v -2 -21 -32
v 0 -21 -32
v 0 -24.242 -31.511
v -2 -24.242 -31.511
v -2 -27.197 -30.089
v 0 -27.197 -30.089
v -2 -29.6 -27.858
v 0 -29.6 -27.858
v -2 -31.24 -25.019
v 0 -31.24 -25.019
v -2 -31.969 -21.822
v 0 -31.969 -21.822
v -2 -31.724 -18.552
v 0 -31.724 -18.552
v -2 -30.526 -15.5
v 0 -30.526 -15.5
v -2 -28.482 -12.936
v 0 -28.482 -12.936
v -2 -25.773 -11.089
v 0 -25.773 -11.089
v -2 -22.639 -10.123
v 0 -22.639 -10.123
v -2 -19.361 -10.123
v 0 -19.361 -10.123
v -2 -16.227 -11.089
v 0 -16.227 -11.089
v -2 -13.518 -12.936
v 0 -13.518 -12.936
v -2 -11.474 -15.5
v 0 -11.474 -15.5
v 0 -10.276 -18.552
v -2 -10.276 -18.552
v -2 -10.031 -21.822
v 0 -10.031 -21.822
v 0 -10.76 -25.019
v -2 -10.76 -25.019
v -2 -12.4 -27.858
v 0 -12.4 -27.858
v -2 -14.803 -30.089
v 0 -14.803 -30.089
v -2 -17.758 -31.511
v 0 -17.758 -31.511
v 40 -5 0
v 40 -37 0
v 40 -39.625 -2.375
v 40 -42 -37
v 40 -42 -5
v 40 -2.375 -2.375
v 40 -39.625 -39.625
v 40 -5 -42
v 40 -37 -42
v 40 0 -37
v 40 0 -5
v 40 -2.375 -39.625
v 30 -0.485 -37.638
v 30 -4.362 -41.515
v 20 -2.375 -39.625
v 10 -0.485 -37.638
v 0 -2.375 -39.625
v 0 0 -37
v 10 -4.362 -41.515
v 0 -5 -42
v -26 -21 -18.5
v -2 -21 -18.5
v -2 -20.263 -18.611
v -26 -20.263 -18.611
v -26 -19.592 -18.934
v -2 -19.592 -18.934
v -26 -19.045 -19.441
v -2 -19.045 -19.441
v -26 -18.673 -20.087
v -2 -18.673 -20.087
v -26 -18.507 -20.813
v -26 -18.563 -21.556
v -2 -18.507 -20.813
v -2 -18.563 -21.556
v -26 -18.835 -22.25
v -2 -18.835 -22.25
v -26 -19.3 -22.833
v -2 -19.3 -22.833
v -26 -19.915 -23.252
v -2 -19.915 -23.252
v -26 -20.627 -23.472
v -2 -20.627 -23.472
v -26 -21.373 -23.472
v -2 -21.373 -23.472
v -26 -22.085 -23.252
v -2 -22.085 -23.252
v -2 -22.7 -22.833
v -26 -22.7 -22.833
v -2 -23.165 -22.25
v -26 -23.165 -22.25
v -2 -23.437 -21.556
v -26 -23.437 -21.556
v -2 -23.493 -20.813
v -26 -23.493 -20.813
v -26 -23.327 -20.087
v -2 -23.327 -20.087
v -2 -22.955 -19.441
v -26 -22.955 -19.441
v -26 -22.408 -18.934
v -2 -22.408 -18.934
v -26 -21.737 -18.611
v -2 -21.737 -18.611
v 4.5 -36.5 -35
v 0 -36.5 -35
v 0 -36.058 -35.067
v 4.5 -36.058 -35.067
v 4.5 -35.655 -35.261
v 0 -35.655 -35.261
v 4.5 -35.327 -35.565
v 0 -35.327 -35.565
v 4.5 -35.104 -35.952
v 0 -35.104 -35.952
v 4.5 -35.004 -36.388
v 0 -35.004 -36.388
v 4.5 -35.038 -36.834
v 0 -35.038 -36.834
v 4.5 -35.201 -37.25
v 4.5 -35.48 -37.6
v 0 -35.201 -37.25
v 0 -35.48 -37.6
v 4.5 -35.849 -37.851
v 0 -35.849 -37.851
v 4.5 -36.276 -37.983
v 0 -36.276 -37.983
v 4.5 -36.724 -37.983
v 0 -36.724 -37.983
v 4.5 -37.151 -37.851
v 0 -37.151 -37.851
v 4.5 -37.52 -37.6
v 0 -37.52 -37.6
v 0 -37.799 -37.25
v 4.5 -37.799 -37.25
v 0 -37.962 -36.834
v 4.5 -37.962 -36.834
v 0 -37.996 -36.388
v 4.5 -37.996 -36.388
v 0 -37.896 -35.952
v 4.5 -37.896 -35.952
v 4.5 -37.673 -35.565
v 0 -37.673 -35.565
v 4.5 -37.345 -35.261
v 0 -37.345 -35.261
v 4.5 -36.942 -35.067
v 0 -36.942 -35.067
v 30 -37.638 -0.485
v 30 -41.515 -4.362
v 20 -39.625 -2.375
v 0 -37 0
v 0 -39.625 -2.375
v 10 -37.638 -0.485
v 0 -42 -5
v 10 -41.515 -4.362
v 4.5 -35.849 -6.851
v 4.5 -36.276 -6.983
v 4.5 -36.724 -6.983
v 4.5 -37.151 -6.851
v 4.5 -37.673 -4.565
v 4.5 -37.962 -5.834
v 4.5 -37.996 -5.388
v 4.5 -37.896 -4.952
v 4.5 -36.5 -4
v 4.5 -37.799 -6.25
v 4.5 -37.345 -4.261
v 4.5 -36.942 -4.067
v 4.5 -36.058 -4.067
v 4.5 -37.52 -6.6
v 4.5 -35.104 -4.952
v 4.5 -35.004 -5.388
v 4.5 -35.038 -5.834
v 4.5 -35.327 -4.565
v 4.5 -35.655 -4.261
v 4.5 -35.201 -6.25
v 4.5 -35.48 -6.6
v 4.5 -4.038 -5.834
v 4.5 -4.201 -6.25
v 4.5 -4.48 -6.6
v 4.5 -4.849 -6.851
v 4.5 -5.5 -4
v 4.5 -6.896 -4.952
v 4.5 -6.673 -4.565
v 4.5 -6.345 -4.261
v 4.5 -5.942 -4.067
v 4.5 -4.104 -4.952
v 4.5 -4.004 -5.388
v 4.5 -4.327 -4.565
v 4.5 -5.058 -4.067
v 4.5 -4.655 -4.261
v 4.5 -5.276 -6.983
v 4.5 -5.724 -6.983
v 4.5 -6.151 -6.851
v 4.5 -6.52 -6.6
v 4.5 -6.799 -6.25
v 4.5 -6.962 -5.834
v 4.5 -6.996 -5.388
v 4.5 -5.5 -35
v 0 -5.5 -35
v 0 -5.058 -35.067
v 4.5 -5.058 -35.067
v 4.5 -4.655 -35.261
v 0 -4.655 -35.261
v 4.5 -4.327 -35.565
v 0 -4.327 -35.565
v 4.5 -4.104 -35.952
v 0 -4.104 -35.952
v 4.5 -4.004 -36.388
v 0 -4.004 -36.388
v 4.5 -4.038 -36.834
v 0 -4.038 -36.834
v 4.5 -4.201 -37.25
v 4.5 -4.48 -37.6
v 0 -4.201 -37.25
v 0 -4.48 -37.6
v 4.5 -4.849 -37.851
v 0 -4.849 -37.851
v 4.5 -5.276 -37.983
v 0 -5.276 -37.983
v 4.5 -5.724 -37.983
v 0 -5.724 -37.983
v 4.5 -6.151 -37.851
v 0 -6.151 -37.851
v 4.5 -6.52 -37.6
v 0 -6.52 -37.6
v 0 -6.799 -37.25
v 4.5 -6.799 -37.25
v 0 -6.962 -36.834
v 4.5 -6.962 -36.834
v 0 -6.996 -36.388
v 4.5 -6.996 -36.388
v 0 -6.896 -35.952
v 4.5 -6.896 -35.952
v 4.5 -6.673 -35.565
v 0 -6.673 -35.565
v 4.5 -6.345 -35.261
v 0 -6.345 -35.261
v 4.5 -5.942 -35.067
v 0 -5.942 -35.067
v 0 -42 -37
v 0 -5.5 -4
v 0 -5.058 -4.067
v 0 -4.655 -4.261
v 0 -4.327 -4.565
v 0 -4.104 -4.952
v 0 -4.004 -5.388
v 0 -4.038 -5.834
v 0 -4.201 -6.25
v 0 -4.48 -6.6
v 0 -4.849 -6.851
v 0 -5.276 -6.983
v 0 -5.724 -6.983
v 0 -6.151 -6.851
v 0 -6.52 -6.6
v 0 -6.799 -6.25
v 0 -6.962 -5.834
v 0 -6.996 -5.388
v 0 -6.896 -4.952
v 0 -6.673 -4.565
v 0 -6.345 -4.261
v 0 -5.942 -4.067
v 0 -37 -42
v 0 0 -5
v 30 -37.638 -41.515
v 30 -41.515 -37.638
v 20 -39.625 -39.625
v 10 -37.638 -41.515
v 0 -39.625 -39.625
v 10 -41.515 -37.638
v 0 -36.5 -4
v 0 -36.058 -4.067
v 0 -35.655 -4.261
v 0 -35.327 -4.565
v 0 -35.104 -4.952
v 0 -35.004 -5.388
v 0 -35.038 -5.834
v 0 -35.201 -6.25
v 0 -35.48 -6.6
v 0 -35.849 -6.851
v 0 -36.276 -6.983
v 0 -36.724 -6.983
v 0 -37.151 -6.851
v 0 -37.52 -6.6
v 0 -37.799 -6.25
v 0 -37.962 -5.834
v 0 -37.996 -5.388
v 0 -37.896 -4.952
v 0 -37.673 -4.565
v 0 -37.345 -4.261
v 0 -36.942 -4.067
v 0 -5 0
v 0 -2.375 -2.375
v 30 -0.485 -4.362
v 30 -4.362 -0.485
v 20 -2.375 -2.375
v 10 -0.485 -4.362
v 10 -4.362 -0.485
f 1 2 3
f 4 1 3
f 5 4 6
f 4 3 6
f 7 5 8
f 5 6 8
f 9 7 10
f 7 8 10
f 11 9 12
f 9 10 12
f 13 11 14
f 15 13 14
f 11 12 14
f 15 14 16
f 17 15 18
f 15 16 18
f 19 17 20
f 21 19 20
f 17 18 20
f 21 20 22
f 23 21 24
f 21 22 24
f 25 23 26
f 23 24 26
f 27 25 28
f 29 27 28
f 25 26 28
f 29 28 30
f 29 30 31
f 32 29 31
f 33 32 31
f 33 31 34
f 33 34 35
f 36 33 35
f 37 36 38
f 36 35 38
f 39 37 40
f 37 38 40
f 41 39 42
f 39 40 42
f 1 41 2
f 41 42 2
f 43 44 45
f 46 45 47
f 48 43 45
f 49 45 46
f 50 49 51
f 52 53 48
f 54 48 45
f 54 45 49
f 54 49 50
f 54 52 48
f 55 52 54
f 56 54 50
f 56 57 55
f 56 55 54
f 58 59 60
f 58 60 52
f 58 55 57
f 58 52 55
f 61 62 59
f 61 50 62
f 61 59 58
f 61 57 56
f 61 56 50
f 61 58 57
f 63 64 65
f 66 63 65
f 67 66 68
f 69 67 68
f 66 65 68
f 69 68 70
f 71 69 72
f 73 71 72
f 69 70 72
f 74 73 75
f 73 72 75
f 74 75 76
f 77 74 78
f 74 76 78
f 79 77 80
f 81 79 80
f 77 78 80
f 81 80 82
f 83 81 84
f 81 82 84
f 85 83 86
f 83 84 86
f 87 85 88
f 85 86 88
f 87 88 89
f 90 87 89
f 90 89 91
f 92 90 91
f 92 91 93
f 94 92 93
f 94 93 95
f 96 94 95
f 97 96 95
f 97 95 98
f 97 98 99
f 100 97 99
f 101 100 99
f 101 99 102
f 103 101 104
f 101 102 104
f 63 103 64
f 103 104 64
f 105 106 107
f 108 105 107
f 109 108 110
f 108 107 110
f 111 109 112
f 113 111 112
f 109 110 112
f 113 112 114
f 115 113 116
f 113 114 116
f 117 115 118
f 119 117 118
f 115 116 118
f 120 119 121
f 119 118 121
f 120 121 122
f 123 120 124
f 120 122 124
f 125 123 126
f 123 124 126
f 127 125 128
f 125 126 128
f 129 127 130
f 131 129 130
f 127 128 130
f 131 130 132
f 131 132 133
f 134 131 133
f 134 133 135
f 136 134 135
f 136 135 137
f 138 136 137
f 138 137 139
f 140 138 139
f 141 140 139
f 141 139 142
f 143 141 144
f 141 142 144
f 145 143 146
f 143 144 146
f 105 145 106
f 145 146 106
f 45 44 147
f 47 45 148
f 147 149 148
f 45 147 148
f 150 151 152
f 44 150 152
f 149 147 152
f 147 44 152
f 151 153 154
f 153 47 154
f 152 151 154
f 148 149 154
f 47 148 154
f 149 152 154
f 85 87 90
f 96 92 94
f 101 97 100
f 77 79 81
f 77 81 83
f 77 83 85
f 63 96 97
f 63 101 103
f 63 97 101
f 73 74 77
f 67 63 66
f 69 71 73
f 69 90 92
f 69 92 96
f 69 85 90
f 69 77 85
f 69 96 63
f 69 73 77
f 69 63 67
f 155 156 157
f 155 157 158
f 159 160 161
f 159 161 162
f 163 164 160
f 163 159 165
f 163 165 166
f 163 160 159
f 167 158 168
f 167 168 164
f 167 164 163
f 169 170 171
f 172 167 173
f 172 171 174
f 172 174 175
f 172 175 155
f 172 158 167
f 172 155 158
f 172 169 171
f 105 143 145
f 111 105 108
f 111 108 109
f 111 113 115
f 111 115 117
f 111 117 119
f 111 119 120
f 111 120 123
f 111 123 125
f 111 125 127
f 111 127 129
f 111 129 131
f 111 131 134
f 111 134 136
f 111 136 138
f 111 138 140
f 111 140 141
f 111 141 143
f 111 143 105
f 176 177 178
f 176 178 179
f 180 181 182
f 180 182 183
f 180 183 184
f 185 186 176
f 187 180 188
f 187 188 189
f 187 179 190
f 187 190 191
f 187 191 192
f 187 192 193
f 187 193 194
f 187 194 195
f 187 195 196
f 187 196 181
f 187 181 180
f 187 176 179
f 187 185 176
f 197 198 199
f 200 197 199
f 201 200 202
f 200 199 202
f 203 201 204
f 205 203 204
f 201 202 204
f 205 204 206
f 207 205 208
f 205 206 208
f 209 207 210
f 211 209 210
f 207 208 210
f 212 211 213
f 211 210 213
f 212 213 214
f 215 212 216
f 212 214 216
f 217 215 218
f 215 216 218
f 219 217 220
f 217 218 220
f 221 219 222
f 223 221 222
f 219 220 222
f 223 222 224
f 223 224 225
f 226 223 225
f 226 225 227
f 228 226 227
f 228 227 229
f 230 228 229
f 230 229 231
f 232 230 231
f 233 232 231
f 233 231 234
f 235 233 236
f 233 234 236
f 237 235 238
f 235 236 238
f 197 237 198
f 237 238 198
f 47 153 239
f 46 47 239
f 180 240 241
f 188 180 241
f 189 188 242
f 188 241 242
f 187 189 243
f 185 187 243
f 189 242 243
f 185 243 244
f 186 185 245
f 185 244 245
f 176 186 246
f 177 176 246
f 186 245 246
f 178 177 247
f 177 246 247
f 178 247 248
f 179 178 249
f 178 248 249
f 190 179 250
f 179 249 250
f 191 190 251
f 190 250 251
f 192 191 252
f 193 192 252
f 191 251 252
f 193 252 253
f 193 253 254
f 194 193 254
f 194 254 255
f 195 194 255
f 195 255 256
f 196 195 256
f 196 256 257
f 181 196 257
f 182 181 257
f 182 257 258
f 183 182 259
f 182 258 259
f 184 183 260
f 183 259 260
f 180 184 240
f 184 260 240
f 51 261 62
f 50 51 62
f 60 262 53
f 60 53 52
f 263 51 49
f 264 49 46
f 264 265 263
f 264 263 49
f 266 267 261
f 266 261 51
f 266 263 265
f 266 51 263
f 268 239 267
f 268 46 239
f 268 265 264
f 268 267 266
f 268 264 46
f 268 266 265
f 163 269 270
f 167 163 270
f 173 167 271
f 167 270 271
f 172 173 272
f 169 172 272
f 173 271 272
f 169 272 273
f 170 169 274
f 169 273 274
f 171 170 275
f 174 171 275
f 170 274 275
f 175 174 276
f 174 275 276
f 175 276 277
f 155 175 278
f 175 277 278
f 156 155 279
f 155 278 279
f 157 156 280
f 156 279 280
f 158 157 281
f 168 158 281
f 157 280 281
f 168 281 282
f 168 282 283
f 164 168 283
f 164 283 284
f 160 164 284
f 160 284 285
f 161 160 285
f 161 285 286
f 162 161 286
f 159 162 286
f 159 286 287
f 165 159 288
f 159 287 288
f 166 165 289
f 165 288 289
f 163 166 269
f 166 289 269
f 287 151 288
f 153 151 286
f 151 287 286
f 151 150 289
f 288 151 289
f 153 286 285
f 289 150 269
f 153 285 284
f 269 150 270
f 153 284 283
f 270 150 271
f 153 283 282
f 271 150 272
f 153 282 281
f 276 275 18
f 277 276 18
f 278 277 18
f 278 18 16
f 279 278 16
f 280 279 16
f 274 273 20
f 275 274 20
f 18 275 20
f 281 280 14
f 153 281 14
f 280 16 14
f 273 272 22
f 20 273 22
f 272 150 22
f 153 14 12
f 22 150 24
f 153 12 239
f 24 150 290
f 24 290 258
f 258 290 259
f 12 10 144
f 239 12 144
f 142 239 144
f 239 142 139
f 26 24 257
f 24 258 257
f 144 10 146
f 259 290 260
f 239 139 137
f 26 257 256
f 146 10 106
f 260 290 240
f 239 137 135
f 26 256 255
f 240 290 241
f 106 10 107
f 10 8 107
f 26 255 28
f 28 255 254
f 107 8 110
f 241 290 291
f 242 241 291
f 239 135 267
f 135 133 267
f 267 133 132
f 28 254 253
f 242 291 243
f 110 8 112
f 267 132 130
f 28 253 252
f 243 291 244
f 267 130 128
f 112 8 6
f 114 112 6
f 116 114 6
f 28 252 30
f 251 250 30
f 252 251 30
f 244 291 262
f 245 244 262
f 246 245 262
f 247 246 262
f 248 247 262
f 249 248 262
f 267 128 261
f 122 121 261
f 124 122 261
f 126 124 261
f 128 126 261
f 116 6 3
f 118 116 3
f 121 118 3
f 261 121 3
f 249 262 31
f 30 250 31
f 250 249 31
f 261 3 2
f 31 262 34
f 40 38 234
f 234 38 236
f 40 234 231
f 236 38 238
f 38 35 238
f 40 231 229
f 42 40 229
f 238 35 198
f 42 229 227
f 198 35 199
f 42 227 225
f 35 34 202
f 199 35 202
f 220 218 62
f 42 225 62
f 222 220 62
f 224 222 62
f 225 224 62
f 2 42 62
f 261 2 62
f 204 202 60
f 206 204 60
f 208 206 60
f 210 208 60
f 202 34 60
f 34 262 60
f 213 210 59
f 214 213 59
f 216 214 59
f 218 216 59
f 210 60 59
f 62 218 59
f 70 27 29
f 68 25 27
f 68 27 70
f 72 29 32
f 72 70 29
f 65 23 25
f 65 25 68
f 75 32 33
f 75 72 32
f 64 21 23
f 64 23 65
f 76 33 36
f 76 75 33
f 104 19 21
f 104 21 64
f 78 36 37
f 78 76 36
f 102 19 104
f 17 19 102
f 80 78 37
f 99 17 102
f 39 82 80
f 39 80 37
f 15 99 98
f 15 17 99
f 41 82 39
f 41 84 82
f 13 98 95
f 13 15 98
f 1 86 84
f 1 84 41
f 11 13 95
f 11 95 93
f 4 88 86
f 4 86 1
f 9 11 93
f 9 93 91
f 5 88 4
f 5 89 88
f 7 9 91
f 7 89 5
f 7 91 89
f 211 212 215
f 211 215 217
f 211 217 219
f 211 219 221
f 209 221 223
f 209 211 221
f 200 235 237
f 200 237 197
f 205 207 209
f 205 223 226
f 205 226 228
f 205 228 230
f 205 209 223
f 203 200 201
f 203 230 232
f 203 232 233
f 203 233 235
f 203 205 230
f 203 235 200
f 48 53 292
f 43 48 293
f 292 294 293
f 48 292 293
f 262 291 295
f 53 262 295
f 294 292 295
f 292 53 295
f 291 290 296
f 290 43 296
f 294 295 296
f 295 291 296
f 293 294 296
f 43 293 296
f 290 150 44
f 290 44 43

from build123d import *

# Parameters (mm, degrees)
SKETCH1_W           = 42
SKETCH1_H           = 42
BOSS_EXTRUDE1_DEPTH = 40
SKETCH2_R           = 11
BOSS_EXTRUDE2_DEPTH = 2
SKETCH3_R           = 2.5
BOSS_EXTRUDE3_DEPTH = 24
SKETCH4_R           = 1.5
CUT_EXTRUDE1_DEPTH  = 4.5
FILLET1_SIZE        = 5


with BuildPart() as part:
    # Sketch1 → Boss-Extrude1 (new body)
    with BuildSketch(Plane(origin=(0, 0, 0), x_dir=(0, 0, -1), z_dir=(1, 0, 0))):
        with Locations((21, -21)):
            Rectangle(SKETCH1_W, SKETCH1_H)
    extrude(amount=BOSS_EXTRUDE1_DEPTH)

    # Sketch2 → Boss-Extrude2 (add)
    with BuildSketch(Plane.ZY):
        with Locations(Location((-21, -21, 0), (0, 0, 180))):
            Circle(SKETCH2_R)
    extrude(amount=BOSS_EXTRUDE2_DEPTH)

    # Sketch3 → Boss-Extrude3 (add)
    with BuildSketch(Plane.ZY.offset(2)):
        with Locations((-21, -21)):
            Circle(SKETCH3_R)
    extrude(amount=BOSS_EXTRUDE3_DEPTH)

    # Sketch4 → Cut-Extrude1 (cut)
    with BuildSketch(Plane.ZY):
        with Locations((-36.5, -5.5)):
            Circle(SKETCH4_R)
        with Locations((-5.5, -5.5)):
            Circle(SKETCH4_R)
        with Locations((-5.5, -36.5)):
            Circle(SKETCH4_R)
        with Locations((-36.5, -36.5)):
            Circle(SKETCH4_R)
    extrude(amount=-CUT_EXTRUDE1_DEPTH, mode=Mode.SUBTRACT)

    # Fillet1
    # a fillet whose section is not a circle: 5 mm, written as the material it takes off along each edge
    with BuildSketch(Plane(origin=(-12.5, -42, 0), x_dir=(0, 1, 0), z_dir=(1, 0, 0)), Plane(origin=(-12.5, 0, 0), x_dir=(0, 0, -1), z_dir=(1, 0, 0))) as fillet1_piece_1:
        with BuildLine():
            Bezier((FILLET1_SIZE, 0), (0, 0), (0, -FILLET1_SIZE), weights=[1, 0.052631579, 1])
            Line((0, -FILLET1_SIZE), (0, 0))
            Line((0, 0), (FILLET1_SIZE, 0))
        make_face()
    extrude(amount=65, mode=Mode.SUBTRACT)
    with BuildSketch(Plane(origin=(-12.5, -42, -42), x_dir=(0, 1, 0), z_dir=(1, 0, 0)), Plane(origin=(-12.5, 0, -42), x_dir=(0, 0, 1), z_dir=(1, 0, 0))) as fillet1_piece_2:
        with BuildLine():
            Bezier((FILLET1_SIZE, 0), (0, 0), (0, FILLET1_SIZE), weights=[1, 0.052631579, 1])
            Line((0, FILLET1_SIZE), (0, 0))
            Line((0, 0), (FILLET1_SIZE, 0))
        make_face()
    extrude(amount=65, mode=Mode.SUBTRACT)


solid = part.part
